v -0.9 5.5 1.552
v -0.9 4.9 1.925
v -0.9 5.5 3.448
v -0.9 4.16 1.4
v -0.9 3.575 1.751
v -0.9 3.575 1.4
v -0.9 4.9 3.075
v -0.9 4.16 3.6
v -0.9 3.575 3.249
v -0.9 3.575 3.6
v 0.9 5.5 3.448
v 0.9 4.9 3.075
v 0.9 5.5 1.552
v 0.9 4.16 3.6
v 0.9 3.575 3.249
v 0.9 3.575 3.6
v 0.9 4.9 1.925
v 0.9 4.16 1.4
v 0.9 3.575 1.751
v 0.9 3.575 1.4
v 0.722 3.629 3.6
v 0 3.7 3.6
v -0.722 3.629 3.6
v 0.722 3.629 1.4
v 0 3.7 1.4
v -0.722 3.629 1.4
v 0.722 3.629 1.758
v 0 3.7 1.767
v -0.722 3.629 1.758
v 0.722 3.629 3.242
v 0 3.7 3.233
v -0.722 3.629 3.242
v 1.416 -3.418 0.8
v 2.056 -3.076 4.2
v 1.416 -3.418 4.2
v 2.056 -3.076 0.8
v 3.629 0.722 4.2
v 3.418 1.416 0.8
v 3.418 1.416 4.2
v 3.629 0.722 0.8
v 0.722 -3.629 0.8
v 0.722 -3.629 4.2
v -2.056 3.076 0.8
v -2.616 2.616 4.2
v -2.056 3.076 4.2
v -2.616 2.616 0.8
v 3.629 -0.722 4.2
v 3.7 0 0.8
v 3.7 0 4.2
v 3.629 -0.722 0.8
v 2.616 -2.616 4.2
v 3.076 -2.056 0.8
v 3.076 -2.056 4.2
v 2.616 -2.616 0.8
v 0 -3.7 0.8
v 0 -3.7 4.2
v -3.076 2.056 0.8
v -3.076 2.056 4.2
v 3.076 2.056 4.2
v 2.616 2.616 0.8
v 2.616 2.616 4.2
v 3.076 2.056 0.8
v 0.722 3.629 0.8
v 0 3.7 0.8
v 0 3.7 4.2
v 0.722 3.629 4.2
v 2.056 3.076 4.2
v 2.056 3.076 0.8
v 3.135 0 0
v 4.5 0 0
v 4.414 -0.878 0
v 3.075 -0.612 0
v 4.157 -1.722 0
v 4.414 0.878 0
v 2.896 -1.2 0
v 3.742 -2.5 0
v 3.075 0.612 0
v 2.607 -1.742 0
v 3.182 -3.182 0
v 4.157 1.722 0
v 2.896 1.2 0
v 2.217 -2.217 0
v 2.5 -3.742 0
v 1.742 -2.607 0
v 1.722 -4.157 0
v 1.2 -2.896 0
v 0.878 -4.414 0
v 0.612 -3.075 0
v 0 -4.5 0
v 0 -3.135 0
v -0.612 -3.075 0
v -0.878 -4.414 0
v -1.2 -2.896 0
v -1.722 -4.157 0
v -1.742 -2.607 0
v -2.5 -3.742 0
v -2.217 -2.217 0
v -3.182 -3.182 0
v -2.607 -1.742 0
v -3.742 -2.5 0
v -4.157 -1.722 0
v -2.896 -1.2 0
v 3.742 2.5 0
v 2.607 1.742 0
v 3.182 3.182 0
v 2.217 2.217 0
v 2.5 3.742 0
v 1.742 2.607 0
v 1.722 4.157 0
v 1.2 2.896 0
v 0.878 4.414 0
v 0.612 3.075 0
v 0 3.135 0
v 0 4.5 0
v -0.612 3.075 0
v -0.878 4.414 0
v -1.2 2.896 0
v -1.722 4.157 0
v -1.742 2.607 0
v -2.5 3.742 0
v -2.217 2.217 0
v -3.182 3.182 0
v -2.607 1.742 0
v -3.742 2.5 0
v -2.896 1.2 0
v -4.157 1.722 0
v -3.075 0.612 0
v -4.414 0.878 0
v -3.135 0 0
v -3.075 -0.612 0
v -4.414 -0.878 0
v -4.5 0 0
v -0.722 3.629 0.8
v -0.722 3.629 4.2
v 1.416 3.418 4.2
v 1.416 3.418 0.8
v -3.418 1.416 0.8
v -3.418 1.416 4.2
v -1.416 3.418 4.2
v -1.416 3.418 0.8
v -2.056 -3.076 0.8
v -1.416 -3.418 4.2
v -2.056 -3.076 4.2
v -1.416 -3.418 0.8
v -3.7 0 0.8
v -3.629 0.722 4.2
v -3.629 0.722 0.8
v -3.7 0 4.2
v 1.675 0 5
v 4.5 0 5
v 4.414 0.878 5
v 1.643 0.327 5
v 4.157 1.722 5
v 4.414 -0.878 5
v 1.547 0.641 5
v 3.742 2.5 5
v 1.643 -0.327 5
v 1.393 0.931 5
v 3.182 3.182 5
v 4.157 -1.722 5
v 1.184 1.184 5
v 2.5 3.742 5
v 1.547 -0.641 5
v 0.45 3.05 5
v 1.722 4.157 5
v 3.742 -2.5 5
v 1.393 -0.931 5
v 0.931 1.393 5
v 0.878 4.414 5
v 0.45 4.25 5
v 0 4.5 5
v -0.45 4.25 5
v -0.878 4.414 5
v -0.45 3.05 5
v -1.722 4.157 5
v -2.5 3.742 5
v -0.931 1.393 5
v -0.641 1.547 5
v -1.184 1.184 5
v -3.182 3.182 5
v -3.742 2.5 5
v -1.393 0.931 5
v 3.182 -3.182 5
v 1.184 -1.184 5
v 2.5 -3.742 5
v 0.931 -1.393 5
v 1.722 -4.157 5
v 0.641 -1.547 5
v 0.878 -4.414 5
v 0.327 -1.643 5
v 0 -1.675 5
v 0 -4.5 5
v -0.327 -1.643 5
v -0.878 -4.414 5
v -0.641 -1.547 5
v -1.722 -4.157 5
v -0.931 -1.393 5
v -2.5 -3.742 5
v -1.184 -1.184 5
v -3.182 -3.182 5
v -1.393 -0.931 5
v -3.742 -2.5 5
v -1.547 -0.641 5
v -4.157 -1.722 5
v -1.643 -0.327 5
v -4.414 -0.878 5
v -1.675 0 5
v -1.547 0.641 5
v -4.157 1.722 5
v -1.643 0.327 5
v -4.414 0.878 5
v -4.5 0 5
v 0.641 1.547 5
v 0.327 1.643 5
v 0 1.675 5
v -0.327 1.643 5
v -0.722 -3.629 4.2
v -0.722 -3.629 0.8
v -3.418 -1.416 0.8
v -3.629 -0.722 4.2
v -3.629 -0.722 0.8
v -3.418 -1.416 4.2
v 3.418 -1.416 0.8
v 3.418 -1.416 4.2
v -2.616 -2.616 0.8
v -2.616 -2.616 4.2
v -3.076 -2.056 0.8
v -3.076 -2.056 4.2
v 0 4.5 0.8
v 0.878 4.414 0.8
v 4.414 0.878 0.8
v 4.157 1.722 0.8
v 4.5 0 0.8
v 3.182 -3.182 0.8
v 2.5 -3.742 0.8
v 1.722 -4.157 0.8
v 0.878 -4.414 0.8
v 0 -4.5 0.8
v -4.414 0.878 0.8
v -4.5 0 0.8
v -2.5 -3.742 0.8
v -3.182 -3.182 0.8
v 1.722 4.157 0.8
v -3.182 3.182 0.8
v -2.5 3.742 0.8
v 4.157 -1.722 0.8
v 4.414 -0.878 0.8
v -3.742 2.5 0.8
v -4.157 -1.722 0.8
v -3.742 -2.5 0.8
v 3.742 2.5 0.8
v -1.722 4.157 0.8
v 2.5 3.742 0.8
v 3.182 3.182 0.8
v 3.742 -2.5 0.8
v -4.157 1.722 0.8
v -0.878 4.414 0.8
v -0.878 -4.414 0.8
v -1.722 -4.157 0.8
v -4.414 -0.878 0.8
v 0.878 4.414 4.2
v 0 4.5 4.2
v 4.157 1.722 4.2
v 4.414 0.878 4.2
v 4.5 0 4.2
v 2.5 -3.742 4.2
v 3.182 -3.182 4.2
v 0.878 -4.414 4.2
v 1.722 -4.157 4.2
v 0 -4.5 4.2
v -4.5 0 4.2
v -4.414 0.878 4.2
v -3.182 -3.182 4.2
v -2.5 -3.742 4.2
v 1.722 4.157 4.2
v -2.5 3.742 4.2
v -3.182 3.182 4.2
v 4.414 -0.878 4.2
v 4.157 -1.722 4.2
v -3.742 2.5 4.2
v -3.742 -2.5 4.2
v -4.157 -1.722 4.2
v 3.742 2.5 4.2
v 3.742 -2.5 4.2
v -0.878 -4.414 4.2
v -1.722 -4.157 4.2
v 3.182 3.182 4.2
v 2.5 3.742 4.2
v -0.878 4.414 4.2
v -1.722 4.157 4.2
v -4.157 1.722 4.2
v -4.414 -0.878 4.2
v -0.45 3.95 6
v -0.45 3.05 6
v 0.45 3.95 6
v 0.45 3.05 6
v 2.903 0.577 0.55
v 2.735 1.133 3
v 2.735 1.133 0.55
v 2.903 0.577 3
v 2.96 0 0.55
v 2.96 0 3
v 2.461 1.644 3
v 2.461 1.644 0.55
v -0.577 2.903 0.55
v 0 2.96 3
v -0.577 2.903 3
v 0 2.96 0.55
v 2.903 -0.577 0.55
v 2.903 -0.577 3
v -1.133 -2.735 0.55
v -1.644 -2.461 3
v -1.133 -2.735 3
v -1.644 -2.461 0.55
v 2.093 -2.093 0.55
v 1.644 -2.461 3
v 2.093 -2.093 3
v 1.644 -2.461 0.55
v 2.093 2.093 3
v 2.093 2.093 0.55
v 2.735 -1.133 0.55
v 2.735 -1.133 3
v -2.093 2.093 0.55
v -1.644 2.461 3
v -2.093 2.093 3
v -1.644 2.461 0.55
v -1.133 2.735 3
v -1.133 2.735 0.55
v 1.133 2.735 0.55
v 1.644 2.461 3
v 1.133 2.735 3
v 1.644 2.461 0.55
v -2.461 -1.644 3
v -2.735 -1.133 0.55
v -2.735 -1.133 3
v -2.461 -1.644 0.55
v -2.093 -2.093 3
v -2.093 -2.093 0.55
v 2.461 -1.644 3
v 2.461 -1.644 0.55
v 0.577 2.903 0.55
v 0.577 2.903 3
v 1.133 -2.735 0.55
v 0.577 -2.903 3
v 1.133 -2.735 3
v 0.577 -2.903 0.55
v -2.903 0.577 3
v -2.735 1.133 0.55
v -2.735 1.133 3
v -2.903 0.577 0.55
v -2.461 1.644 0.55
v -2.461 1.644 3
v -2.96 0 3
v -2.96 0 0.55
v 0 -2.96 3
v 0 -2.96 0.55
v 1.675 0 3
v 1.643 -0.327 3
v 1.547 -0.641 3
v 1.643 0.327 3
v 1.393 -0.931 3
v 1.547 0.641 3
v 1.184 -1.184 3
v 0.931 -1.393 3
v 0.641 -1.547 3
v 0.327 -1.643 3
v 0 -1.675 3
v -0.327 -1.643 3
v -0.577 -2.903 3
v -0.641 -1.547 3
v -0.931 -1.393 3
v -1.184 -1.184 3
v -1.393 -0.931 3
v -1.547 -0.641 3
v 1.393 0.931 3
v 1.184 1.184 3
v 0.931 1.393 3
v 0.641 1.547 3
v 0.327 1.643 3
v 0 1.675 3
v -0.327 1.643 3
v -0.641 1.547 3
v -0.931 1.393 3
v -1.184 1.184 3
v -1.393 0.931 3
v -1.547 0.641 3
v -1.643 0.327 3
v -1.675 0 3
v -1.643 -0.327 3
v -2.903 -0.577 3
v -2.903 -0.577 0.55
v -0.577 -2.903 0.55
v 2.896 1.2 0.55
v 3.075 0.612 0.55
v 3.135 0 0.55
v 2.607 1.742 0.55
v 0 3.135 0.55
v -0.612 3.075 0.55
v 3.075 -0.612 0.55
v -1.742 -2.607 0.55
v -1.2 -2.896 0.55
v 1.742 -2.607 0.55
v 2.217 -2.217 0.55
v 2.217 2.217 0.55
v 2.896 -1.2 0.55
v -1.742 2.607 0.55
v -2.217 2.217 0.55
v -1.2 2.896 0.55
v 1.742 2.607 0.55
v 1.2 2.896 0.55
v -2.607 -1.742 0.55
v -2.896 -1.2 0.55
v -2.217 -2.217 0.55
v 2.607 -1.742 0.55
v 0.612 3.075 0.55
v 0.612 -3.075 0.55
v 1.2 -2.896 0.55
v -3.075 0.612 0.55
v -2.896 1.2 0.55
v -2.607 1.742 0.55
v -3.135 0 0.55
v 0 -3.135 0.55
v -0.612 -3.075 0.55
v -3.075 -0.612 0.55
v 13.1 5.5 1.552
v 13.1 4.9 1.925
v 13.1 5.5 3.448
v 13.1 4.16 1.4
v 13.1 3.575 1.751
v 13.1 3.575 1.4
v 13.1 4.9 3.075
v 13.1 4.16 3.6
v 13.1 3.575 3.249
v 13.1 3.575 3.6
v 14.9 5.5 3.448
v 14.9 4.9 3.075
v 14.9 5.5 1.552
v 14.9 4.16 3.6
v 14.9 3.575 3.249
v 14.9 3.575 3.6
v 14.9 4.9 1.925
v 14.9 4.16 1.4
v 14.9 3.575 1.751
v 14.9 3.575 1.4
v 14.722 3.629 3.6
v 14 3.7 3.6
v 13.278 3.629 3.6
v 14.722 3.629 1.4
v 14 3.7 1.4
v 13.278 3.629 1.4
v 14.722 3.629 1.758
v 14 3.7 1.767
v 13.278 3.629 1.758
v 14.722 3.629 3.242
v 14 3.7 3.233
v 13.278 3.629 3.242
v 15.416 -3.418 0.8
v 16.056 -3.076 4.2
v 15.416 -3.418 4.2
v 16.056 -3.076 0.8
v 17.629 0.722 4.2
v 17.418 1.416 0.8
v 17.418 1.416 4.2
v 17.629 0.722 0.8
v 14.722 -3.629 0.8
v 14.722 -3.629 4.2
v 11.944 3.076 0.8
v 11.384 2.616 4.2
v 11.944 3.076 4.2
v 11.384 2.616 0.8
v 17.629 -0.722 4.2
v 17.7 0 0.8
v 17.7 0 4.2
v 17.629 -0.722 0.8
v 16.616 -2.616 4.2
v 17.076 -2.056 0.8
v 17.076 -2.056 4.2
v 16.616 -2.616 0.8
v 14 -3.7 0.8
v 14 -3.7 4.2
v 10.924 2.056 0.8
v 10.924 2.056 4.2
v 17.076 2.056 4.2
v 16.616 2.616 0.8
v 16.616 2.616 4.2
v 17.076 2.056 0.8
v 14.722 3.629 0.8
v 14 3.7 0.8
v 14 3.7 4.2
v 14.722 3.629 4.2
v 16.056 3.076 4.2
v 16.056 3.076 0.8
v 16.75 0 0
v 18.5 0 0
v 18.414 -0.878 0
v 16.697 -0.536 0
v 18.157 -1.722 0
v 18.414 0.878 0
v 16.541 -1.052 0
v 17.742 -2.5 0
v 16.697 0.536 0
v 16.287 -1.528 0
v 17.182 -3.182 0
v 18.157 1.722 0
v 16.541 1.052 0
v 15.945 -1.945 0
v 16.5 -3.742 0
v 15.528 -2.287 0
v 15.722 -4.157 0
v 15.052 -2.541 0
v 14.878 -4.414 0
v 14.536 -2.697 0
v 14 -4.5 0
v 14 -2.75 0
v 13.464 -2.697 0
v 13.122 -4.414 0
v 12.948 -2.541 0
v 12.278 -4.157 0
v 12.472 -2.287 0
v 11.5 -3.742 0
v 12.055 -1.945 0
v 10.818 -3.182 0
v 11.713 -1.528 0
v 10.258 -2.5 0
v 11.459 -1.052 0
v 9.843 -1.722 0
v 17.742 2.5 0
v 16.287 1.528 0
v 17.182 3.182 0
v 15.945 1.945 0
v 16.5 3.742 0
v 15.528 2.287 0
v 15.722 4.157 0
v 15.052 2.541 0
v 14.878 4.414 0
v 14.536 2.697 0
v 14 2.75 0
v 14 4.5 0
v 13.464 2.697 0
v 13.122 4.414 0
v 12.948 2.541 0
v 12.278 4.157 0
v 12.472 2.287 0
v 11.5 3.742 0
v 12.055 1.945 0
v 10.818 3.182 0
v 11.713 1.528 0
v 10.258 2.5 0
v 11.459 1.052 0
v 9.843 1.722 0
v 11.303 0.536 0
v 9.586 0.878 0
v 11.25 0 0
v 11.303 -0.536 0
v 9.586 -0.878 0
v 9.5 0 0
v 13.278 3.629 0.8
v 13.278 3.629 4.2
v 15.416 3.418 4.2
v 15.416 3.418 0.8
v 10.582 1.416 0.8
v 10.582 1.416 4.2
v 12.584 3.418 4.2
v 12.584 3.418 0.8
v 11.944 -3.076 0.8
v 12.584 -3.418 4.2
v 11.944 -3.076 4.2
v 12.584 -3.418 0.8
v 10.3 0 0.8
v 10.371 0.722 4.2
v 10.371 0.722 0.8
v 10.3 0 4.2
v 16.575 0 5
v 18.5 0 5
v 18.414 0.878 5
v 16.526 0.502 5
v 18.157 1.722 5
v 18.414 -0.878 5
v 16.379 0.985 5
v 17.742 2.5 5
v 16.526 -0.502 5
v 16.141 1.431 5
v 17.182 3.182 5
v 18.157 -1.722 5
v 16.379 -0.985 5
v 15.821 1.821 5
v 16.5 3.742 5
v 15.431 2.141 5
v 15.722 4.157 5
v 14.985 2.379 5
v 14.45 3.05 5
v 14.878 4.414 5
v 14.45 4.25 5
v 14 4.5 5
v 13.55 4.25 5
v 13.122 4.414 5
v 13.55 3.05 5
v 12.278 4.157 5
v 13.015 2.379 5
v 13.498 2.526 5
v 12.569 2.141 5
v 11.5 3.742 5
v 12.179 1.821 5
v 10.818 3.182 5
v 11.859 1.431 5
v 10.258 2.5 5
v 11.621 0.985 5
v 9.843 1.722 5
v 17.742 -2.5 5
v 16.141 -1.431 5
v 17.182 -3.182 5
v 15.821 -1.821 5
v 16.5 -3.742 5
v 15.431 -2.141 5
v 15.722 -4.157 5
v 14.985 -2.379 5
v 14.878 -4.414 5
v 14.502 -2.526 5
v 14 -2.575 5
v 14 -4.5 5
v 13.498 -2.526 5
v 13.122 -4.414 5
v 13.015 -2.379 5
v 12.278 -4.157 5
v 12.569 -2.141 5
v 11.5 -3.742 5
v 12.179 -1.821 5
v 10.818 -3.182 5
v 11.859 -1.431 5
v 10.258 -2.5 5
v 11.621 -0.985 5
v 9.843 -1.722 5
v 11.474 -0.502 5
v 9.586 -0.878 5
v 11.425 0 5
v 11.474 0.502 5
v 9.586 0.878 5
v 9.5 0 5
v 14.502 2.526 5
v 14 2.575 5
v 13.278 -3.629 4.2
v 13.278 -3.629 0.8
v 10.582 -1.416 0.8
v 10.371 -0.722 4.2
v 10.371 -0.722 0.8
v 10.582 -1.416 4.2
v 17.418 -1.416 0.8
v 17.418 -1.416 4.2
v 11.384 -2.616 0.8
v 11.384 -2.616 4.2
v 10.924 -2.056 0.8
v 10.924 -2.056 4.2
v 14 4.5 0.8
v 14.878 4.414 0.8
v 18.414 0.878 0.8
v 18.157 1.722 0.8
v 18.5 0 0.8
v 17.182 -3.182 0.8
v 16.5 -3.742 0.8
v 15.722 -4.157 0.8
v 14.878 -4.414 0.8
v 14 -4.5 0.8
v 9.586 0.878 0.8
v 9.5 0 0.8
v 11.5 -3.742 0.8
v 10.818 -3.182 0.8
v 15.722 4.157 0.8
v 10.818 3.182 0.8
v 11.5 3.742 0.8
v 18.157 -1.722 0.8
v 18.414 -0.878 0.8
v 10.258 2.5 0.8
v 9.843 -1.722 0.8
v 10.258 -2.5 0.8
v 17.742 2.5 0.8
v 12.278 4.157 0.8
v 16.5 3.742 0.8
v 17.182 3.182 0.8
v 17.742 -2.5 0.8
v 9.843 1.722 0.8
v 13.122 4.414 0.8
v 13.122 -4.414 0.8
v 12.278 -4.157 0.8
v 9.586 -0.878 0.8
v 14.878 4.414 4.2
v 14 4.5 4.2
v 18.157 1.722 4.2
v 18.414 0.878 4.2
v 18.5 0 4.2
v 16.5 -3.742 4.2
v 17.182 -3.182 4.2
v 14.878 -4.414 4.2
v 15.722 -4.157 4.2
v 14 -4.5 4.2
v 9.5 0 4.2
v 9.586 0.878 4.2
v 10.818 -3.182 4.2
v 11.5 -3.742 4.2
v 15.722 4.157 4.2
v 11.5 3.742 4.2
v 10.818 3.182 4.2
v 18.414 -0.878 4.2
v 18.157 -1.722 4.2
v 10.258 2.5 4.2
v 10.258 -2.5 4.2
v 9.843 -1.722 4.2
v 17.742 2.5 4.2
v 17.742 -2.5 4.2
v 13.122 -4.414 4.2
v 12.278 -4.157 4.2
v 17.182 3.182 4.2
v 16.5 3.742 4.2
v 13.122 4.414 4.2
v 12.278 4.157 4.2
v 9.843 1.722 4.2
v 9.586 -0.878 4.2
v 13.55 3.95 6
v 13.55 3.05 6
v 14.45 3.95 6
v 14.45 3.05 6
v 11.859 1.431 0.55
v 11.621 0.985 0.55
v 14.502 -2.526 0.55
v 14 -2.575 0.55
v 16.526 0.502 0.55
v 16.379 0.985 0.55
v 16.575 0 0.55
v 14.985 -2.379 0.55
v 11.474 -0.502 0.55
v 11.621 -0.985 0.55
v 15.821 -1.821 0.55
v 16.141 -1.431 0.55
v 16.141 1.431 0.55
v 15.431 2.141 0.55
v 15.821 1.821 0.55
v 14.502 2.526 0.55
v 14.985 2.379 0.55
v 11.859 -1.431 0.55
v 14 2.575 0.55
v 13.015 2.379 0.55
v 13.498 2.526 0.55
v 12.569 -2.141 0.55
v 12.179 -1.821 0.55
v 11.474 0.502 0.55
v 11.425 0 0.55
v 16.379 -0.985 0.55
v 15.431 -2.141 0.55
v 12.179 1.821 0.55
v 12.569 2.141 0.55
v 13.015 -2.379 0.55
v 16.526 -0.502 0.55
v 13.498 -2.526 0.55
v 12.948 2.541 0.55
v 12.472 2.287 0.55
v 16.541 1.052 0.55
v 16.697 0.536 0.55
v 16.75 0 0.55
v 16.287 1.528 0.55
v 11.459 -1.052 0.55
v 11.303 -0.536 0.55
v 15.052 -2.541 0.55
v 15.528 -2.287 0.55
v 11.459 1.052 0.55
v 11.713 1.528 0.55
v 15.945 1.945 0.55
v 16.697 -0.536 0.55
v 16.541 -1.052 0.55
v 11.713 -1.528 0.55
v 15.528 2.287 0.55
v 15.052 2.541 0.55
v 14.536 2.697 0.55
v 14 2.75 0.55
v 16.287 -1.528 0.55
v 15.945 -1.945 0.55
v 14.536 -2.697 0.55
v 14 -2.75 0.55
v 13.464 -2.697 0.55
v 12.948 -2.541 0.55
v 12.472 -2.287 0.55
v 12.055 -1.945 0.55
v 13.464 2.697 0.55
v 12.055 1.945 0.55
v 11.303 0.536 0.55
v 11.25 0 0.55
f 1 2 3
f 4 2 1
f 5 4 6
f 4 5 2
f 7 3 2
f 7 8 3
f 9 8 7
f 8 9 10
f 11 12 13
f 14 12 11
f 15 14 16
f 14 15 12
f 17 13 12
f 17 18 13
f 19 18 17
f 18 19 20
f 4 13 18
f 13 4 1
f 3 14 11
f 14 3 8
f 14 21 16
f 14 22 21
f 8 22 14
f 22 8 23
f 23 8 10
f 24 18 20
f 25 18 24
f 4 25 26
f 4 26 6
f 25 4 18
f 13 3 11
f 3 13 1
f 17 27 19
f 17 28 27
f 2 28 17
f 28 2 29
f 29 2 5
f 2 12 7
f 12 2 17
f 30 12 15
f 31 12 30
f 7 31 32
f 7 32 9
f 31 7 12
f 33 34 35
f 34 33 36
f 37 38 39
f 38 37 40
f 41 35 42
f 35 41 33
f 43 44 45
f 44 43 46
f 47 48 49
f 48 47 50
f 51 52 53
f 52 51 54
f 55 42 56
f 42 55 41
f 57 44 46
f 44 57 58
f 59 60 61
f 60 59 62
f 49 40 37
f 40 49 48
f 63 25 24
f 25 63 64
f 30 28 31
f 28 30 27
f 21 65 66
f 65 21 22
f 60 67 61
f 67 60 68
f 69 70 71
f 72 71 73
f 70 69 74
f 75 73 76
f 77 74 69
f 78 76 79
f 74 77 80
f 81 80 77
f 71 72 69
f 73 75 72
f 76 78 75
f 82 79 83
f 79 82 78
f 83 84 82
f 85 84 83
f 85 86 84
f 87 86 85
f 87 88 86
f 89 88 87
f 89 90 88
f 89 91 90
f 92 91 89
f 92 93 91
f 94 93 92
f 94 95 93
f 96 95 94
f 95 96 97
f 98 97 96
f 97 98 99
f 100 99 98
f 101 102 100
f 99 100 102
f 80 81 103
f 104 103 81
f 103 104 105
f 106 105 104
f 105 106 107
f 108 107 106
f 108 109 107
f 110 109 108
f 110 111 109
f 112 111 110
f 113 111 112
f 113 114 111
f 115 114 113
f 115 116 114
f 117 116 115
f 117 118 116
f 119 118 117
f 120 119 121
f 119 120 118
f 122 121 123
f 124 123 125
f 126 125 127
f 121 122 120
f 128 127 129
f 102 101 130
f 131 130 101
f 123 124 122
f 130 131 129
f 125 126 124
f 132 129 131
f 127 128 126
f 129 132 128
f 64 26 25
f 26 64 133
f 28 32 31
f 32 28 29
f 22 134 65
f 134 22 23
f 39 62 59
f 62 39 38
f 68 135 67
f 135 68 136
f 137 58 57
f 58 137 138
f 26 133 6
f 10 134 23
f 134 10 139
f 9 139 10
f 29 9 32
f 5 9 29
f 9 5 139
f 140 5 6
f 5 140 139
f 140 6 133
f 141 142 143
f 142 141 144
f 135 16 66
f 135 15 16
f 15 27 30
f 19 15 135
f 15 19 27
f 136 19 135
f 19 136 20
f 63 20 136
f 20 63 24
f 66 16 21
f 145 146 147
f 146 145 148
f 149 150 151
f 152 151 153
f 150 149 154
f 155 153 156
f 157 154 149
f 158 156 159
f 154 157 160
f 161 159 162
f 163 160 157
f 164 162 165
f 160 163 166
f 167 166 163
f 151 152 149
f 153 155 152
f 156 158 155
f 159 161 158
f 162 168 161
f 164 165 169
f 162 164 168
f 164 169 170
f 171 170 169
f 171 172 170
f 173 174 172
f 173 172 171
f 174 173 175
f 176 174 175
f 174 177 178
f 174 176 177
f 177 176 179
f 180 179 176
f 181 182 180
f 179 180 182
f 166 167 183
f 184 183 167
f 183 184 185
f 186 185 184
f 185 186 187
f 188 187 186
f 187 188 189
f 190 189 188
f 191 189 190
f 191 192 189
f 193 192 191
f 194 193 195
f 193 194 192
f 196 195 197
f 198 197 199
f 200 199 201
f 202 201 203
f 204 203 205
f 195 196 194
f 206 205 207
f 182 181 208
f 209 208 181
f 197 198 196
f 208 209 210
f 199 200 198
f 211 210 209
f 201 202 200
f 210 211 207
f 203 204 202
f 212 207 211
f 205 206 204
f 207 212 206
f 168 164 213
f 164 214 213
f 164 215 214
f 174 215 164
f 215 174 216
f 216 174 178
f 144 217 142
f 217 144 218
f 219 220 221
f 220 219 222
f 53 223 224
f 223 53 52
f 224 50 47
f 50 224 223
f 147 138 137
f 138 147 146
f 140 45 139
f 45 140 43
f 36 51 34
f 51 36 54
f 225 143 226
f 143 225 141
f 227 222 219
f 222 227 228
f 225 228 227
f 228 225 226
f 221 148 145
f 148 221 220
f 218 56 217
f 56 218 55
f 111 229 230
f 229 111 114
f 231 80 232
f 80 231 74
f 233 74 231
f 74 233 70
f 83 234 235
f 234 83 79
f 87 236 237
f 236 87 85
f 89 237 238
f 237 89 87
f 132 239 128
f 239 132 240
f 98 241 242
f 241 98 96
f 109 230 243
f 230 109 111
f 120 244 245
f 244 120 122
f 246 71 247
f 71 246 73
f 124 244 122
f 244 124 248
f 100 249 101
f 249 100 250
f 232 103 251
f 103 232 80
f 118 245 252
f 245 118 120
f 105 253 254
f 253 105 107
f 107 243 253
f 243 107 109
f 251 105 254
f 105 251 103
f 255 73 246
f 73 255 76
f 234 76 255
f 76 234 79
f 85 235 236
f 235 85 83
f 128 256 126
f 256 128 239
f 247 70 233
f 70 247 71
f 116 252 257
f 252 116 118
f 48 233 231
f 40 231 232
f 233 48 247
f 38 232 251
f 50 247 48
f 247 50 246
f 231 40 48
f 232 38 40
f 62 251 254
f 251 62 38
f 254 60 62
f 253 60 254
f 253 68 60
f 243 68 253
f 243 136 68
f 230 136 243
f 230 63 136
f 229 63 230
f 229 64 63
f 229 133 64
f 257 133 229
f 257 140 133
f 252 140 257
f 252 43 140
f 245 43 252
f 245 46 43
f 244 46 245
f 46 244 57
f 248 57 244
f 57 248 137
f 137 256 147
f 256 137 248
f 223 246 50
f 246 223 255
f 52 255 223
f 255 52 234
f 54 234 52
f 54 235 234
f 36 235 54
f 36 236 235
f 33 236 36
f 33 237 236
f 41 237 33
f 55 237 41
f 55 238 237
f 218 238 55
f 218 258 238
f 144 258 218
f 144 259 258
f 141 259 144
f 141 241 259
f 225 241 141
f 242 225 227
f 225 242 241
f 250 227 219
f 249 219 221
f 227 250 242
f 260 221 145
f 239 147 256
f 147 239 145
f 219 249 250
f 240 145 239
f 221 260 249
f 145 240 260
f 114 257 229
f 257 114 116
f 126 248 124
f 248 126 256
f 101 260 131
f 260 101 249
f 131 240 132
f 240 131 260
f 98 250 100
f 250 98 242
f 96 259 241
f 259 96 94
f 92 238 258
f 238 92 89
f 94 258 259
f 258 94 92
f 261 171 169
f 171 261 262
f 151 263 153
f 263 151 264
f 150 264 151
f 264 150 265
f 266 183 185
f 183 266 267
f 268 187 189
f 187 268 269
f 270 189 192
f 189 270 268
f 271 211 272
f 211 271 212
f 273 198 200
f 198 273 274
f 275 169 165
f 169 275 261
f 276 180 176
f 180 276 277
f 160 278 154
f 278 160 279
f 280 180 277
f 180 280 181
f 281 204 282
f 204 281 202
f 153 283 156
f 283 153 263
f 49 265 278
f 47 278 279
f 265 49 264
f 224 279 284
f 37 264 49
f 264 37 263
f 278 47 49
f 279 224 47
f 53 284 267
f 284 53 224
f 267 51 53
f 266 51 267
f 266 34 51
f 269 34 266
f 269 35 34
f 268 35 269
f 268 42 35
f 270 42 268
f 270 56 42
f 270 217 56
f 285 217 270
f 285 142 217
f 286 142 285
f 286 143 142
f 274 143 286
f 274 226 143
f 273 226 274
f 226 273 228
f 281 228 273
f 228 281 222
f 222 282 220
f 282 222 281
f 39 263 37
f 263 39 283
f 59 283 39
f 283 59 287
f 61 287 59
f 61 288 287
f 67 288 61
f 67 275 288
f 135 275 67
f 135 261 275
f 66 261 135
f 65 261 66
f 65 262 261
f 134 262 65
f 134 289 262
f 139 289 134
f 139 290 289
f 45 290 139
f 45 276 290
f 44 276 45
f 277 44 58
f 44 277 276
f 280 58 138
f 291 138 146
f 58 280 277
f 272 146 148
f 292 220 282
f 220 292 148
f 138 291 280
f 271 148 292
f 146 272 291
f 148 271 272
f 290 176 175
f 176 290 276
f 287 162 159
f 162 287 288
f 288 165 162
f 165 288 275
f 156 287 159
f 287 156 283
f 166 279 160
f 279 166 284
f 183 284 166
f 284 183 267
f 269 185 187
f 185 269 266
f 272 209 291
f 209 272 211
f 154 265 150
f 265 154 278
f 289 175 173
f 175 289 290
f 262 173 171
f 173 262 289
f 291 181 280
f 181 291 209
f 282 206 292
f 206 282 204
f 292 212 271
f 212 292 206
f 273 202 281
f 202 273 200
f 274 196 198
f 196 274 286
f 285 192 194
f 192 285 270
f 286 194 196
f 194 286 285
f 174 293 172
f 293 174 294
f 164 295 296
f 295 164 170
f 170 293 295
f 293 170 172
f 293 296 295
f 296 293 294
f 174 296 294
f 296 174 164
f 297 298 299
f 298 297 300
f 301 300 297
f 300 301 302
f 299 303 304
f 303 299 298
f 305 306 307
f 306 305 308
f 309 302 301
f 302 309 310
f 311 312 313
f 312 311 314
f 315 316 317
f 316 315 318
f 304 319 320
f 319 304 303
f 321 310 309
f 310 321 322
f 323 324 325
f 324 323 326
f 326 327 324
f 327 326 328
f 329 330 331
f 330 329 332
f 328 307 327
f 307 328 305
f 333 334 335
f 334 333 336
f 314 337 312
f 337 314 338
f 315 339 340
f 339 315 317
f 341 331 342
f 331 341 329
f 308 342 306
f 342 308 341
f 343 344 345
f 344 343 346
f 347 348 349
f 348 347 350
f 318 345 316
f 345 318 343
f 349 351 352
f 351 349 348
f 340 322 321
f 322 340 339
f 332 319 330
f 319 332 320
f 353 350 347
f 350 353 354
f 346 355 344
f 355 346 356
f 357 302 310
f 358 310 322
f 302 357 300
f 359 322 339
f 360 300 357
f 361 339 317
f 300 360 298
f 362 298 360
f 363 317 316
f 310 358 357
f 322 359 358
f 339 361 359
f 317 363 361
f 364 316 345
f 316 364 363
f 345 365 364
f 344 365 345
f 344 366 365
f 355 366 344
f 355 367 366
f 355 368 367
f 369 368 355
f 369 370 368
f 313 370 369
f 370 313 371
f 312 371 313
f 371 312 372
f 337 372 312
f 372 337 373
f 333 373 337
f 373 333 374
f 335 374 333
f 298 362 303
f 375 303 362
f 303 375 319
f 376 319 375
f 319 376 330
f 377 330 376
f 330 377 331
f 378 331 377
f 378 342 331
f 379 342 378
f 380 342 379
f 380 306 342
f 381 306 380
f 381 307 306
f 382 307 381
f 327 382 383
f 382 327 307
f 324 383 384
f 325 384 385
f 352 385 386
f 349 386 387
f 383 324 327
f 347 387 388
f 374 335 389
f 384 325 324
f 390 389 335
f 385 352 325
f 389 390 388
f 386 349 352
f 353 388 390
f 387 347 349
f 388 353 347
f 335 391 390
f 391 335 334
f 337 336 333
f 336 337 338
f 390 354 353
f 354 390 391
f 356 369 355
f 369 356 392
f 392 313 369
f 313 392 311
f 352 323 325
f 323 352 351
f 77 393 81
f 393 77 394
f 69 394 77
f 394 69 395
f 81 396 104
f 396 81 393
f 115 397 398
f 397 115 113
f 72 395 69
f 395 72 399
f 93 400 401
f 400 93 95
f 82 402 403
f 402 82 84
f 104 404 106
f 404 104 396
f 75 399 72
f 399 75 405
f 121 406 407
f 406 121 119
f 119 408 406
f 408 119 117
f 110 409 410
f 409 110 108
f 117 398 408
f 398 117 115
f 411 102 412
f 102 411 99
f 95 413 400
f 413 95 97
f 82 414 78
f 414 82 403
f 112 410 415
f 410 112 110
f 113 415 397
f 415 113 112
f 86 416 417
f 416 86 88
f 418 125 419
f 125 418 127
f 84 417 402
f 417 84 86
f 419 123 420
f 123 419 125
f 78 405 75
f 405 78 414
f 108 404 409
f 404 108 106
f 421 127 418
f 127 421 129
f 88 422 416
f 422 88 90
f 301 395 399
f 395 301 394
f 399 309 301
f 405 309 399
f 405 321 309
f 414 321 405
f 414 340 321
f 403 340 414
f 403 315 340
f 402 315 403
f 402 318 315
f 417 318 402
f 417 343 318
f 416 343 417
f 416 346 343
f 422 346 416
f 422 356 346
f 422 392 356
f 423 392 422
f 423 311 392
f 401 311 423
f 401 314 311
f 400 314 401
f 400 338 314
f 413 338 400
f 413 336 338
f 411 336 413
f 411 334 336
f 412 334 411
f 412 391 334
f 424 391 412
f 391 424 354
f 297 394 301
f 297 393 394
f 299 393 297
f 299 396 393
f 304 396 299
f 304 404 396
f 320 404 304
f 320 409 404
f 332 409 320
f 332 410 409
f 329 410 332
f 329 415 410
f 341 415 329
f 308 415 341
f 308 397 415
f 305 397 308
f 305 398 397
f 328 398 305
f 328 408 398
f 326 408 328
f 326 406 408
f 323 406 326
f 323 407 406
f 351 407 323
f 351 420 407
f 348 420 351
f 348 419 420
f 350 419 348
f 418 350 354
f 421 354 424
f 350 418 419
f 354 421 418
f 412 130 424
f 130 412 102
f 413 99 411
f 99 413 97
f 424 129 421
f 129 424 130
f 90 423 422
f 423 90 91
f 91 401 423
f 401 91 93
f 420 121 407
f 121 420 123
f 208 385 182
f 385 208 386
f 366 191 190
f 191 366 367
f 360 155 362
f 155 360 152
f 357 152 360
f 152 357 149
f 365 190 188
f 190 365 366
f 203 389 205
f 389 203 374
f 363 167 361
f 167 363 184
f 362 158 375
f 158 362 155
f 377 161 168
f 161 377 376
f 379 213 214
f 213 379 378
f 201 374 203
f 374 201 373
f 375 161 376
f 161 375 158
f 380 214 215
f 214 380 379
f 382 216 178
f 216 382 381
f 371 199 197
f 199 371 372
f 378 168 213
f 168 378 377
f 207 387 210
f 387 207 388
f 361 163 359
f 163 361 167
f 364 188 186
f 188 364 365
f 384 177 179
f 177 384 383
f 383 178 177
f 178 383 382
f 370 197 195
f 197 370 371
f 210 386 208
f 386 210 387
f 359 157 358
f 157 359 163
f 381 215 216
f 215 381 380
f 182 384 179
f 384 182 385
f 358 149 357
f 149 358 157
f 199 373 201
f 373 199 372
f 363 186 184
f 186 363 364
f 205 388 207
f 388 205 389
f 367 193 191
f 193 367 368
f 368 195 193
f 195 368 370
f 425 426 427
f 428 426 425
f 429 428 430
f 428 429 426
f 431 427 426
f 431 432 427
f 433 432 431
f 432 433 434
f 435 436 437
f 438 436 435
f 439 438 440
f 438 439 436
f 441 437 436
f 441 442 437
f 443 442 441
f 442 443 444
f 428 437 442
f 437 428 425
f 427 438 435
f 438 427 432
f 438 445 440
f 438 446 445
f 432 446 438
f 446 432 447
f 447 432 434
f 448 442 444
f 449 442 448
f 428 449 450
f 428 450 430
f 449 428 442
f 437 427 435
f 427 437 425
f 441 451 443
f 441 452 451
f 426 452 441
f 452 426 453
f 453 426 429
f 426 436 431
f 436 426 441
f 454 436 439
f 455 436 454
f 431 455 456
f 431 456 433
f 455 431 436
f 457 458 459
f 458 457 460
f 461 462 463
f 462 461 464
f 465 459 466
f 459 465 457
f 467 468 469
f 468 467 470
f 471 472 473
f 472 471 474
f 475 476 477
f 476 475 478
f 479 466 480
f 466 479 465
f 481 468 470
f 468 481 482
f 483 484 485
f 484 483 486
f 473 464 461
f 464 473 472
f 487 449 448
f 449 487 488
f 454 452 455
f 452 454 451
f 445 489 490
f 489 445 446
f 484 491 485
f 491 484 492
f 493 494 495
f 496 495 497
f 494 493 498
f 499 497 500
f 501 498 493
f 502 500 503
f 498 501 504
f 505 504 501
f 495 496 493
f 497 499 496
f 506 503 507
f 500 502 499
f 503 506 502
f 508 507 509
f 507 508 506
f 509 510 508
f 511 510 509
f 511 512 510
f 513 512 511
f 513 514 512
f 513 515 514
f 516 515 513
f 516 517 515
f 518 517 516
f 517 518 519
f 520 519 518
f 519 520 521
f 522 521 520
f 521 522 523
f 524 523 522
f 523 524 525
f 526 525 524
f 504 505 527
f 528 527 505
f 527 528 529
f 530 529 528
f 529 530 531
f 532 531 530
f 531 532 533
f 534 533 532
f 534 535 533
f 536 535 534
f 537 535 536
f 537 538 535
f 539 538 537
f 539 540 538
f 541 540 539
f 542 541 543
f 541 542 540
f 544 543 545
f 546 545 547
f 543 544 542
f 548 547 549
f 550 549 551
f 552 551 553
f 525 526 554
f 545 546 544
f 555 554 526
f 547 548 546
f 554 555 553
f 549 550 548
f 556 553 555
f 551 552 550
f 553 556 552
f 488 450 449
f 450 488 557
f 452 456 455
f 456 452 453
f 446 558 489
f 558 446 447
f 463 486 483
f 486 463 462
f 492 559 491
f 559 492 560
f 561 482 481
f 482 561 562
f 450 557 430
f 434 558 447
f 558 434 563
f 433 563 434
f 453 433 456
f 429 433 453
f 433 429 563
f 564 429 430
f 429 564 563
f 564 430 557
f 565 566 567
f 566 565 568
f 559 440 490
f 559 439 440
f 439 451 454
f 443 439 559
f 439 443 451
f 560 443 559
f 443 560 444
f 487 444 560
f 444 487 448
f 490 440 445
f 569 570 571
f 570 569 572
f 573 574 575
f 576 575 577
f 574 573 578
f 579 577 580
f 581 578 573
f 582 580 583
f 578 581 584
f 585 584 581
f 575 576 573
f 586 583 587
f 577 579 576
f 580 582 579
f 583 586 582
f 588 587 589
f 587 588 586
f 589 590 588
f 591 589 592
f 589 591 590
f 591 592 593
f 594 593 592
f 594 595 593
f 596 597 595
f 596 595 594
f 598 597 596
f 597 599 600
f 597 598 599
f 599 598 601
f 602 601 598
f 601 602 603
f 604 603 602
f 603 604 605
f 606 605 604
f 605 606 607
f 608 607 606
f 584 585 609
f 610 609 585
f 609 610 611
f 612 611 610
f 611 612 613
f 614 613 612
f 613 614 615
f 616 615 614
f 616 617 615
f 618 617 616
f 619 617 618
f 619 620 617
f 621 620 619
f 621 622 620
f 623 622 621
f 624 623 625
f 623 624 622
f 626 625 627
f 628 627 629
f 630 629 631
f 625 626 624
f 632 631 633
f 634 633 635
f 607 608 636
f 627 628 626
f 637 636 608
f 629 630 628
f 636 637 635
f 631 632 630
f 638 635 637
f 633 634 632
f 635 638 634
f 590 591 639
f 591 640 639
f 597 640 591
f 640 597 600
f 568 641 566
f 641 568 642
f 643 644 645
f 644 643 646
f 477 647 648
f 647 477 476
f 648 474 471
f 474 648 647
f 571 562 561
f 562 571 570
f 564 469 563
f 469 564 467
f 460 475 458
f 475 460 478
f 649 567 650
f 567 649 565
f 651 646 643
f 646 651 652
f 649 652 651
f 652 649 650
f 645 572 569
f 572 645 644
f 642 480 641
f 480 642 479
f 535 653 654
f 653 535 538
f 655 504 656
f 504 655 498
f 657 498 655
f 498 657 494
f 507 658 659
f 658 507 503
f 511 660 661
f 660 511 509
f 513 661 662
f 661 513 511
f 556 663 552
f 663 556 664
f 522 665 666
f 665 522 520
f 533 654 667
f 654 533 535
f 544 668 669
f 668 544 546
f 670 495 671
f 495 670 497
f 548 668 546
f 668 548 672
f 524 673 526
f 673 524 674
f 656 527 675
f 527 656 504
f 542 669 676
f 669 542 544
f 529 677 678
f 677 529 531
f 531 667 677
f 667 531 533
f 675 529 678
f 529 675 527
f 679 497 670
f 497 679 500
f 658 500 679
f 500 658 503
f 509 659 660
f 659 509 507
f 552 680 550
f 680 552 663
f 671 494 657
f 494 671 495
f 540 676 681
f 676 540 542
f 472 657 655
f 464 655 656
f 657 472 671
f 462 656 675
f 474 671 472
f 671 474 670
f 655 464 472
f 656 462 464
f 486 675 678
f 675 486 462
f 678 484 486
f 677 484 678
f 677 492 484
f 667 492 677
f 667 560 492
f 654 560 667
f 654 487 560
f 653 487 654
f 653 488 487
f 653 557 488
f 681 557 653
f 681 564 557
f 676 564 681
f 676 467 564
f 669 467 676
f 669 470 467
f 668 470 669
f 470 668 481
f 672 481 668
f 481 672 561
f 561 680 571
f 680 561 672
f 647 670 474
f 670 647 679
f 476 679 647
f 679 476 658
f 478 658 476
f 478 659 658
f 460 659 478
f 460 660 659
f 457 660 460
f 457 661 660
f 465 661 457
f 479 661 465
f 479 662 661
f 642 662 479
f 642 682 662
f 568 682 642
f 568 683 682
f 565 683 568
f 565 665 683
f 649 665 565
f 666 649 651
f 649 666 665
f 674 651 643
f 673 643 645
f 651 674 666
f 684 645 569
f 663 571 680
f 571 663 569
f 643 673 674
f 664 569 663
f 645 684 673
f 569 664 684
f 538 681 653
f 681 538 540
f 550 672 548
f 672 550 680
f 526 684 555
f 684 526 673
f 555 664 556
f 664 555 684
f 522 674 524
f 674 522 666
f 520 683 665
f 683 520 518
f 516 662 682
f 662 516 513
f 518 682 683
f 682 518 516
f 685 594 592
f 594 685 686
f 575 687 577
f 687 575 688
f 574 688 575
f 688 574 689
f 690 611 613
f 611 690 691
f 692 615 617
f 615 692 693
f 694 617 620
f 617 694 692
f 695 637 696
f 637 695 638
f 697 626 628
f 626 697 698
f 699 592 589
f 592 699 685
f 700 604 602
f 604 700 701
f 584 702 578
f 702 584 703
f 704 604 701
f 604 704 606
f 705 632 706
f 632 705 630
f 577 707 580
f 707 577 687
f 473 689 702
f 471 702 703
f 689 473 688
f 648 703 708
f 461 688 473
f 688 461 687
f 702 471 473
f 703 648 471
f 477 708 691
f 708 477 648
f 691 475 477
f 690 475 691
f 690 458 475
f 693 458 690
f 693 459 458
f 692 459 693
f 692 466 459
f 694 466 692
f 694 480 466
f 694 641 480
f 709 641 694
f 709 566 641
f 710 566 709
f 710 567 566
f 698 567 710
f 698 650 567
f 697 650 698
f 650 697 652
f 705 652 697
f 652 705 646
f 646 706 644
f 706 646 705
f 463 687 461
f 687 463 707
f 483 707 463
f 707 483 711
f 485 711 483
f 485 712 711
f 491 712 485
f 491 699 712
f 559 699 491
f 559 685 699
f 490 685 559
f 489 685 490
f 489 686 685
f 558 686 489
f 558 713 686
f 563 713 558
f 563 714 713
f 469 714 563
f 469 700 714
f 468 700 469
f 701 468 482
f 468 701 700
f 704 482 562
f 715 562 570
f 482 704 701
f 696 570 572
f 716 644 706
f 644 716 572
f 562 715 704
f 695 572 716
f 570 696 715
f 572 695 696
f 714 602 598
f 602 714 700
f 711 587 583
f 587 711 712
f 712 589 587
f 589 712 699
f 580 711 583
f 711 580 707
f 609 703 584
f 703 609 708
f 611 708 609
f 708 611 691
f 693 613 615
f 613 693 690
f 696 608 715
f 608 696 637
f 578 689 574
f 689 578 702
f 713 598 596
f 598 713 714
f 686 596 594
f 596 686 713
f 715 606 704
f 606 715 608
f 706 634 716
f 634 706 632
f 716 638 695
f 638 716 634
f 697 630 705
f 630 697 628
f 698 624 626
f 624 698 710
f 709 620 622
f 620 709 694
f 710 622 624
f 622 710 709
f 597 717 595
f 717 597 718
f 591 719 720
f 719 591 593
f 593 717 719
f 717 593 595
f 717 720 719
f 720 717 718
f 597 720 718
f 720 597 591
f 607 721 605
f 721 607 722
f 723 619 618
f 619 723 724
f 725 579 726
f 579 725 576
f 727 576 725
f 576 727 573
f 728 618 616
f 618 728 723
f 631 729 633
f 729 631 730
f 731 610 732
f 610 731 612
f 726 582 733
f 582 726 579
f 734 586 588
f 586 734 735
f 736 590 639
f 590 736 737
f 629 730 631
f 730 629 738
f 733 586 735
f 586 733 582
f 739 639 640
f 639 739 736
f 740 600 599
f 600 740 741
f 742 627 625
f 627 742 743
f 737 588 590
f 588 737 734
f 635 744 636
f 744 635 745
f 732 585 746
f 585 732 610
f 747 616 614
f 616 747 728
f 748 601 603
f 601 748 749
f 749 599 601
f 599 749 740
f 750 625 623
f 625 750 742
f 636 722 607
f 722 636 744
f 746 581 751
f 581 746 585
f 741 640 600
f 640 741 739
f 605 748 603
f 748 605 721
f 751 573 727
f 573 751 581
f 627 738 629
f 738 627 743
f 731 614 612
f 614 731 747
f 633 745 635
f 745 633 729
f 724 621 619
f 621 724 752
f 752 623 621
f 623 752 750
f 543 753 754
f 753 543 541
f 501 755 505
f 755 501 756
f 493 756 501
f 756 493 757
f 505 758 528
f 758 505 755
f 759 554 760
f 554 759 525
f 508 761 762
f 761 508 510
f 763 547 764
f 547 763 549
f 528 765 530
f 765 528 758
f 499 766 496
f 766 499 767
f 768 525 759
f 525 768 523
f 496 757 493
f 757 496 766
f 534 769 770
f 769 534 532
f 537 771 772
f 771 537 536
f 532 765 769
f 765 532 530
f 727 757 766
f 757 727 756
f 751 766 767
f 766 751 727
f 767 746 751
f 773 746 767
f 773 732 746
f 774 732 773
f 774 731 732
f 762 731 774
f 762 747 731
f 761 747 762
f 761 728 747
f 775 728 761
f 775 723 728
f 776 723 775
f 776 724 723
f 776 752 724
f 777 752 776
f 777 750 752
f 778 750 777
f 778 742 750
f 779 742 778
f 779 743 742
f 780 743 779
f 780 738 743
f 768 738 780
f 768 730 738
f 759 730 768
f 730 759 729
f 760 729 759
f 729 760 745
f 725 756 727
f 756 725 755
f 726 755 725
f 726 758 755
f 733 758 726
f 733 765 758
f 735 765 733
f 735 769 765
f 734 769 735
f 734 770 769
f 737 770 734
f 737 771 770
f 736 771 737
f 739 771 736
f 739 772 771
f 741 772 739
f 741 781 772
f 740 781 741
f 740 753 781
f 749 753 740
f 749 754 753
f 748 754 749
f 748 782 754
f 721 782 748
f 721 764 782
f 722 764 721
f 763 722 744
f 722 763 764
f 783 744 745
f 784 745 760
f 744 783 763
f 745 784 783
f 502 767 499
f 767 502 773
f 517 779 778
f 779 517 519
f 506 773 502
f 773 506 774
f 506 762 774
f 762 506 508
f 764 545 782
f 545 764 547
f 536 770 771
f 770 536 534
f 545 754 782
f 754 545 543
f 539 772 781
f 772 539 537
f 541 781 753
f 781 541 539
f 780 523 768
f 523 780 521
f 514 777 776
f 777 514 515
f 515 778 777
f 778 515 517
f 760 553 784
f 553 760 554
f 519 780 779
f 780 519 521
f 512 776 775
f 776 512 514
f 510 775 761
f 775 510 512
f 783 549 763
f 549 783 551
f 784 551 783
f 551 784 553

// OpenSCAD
// Young Town / 12888-style CANON capstan pair.
// Minute remains canon at 3.58 mm. Hour is now a candidate set.
//
//   MINUTE capstan: 3.58 mm top bore
//   HOUR candidates: 5.15 mm straight bore
//
// This file renders one minute capstan plus hour candidates.
//
// Intended stack model:
// - top smaller rotating post = minute output
// - middle larger sleeve = hour output
// - bottom collar/boss = stationary guide, avoid clamping it
//
// Both capstans use:
// - flipped-trapezoid string eyelet on +Y
// - top indicator horn / gnomon also on +Y, aligned with the string eyelet/thread hole
// - geometry tuned for 0.4 mm nozzle and fishing line

$fn = 32;
eps = 0.05;

// ---------- selected fits ----------

minute_bore_d = 3.35;          // selected minute fit
hour_bores    = [5.15];        // current hour candidate/canon

minute_lower_clearance_d = 5.92;   // clears large/snap-family hour sleeve
minute_tight_bore_h      = 2.0;    // upper grip length on minute post

// ---------- capstan geometry ----------

total_h  = 5.0;
flange_h = 0.80;

drum_d   = 7.4;
flange_d = 9.0;

// small bottom-only flare to forgive first-layer roughness
bore_mouth_extra = 0.35;
bore_mouth_h     = 0.55;

// pair layout
part_spacing_x = 14;

// ---------- string eyelet geometry ----------

string_eyelet_enabled = true;

// required clearance from top/bottom flange faces
string_eyelet_flange_gap_z = 0.60;

// width around the capstan circumference
string_eyelet_w_x = 1.8;

// overlap into drum for fusion
string_eyelet_drum_overlap_y = 0.20;

// protrusion beyond flange radius; keep small for boss-guide clearance
string_eyelet_beyond_flange_y = 1.2;

// flipped trapezoid: tall face at drum, shorter face outside
// Slightly taller than prior version to open the thread hole.
string_eyelet_inner_face_h_z = 2.35;
string_eyelet_outer_face_h_z = 1.85;

// printable walls around eyelet void
// Reduced cautiously for easier threading with fishing line.
string_eyelet_wall_z = 0.35;
string_eyelet_outer_wall_y = 0.8;

// lets void reach cleanly to drum-side of eyelet without cutting actual drum
string_eyelet_void_inset_y = 0.70;

// ---------- top indicator horn ----------

indicator_horn_enabled = true;

// Horn is now aligned with the +Y string eyelet/thread hole.
// It lives on the top rim in the same radial direction as the eyelet.
indicator_horn_inner_y = 3.05;
indicator_horn_outer_y = 4.25;
indicator_horn_w_x     = 0.90;
indicator_horn_h_z     = 1.00;
indicator_horn_taper_y = 0.30;


// ---------- helpers ----------

module cyl(d, h, z=0) {
    translate([0,0,z])
        cylinder(d=d, h=h);
}

// Prism extruded along X from a 2D Y/Z polygon.
// points_yz must be ordered around the polygon perimeter.
module prism_x(points_yz, w_x) {
    n = len(points_yz);

    polyhedron(
        points = concat(
            [for (p = points_yz) [-w_x/2, p[0], p[1]]],
            [for (p = points_yz) [ w_x/2, p[0], p[1]]]
        ),
        faces = concat(
            [[for (i = [n-1:-1:0]) i]],
            [[for (i = [0:n-1]) i + n]],
            [for (i = [0:n-1])
                [i, (i + 1) % n, ((i + 1) % n) + n, i + n]
            ]
        )
    );
}


// ---------- top indicator horn ----------

module top_indicator_horn() {
    if (indicator_horn_enabled) {
        // Thin vertical fin / gnomon on the top flange rim.
        // Aligned with the +Y string eyelet/thread hole.
        prism_x(
            [
                [indicator_horn_inner_y, total_h],
                [indicator_horn_outer_y, total_h],
                [indicator_horn_outer_y - indicator_horn_taper_y, total_h + indicator_horn_h_z],
                [indicator_horn_inner_y, total_h + indicator_horn_h_z]
            ],
            indicator_horn_w_x
        );
    }
}


// ---------- flipped trapezoid string eyelet ----------

function eyelet_channel_z0() =
    flange_h + string_eyelet_flange_gap_z;

function eyelet_channel_z1() =
    total_h - flange_h - string_eyelet_flange_gap_z;

function eyelet_mid_z() =
    total_h / 2;

function eyelet_inner_y() =
    drum_d/2 - string_eyelet_drum_overlap_y;

function eyelet_outer_y() =
    flange_d/2 + string_eyelet_beyond_flange_y;

function eyelet_inner_z0() =
    eyelet_mid_z() - string_eyelet_inner_face_h_z/2;

function eyelet_inner_z1() =
    eyelet_mid_z() + string_eyelet_inner_face_h_z/2;

function eyelet_outer_z0() =
    eyelet_mid_z() - string_eyelet_outer_face_h_z/2;

function eyelet_outer_z1() =
    eyelet_mid_z() + string_eyelet_outer_face_h_z/2;

function eyelet_void_inner_y() =
    drum_d/2 - string_eyelet_void_inset_y;

function eyelet_void_outer_y() =
    eyelet_outer_y() - string_eyelet_outer_wall_y;

function eyelet_void_inner_z0() =
    eyelet_inner_z0() + string_eyelet_wall_z;

function eyelet_void_inner_z1() =
    eyelet_inner_z1() - string_eyelet_wall_z;

function eyelet_void_outer_z0() =
    eyelet_outer_z0() + string_eyelet_wall_z;

function eyelet_void_outer_z1() =
    eyelet_outer_z1() - string_eyelet_wall_z;

module flipped_trapezoid_eyelet_solid_body() {
    intersection() {
        prism_x(
            [
                [eyelet_inner_y(), eyelet_inner_z0()],
                [eyelet_outer_y(), eyelet_outer_z0()],
                [eyelet_outer_y(), eyelet_outer_z1()],
                [eyelet_inner_y(), eyelet_inner_z1()]
            ],
            string_eyelet_w_x
        );

        // hard Z clip to keep eyelet between flange faces
        translate([0, 0, total_h/2])
            cube(
                [
                    flange_d + 2,
                    flange_d + 2,
                    eyelet_channel_z1() - eyelet_channel_z0()
                ],
                center=true
            );
    }
}

module flipped_trapezoid_eyelet_inner_polygon_void() {
    // Subtracted only from eyelet body, not from capstan/drum.
    prism_x(
        [
            [eyelet_void_inner_y(), eyelet_void_inner_z0()],
            [eyelet_void_outer_y(), eyelet_void_outer_z0()],
            [eyelet_void_outer_y(), eyelet_void_outer_z1()],
            [eyelet_void_inner_y(), eyelet_void_inner_z1()]
        ],
        string_eyelet_w_x + 2*eps
    );
}

module polygon_cut_flipped_trapezoid_eyelet() {
    difference() {
        flipped_trapezoid_eyelet_solid_body();
        flipped_trapezoid_eyelet_inner_polygon_void();
    }
}


// ---------- shared shell ----------

module capstan_shell() {
    union() {
        // center winding drum
        cyl(drum_d, total_h);

        // bottom retaining flange
        cyl(flange_d, flange_h);

        // top retaining flange
        cyl(flange_d, flange_h, total_h - flange_h);

        // string eyelet on +Y side
        if (string_eyelet_enabled)
            polygon_cut_flipped_trapezoid_eyelet();

        // top indicator horn aligned with +Y string eyelet
        top_indicator_horn();
    }
}


// ---------- final capstans ----------

module minute_capstan() {
    lower_h = total_h - minute_tight_bore_h;

    difference() {
        capstan_shell();

        // Lower clearance cavity over the hour sleeve.
        translate([0,0,-eps])
            cylinder(d=minute_lower_clearance_d, h=lower_h + eps);

        // Small bottom mouth easing.
        translate([0,0,-eps])
            cylinder(d=minute_lower_clearance_d + bore_mouth_extra, h=bore_mouth_h + eps);

        // Upper tight minute-shaft grip.
        translate([0,0,lower_h])
            cylinder(d=minute_bore_d, h=minute_tight_bore_h + eps);
    }
}

module hour_capstan(bore_d=5.15) {
    difference() {
        capstan_shell();

        // Straight hour-sleeve press-fit bore.
        translate([0,0,-eps])
            cylinder(d=bore_d, h=total_h + 2*eps);

        // Small bottom mouth easing.
        translate([0,0,-eps])
            cylinder(d=bore_d + bore_mouth_extra, h=bore_mouth_h + eps);
    }
}


// ---------- render minute + hour candidates ----------

// Leftmost: minute canon 3.58.
//translate([0, 0, 0])
    minute_capstan();

// Hour candidates.
for (i = [0:len(hour_bores)-1]) {
    translate([(i + 1) * part_spacing_x, 0, 0])
        hour_capstan(hour_bores[i]);
}
